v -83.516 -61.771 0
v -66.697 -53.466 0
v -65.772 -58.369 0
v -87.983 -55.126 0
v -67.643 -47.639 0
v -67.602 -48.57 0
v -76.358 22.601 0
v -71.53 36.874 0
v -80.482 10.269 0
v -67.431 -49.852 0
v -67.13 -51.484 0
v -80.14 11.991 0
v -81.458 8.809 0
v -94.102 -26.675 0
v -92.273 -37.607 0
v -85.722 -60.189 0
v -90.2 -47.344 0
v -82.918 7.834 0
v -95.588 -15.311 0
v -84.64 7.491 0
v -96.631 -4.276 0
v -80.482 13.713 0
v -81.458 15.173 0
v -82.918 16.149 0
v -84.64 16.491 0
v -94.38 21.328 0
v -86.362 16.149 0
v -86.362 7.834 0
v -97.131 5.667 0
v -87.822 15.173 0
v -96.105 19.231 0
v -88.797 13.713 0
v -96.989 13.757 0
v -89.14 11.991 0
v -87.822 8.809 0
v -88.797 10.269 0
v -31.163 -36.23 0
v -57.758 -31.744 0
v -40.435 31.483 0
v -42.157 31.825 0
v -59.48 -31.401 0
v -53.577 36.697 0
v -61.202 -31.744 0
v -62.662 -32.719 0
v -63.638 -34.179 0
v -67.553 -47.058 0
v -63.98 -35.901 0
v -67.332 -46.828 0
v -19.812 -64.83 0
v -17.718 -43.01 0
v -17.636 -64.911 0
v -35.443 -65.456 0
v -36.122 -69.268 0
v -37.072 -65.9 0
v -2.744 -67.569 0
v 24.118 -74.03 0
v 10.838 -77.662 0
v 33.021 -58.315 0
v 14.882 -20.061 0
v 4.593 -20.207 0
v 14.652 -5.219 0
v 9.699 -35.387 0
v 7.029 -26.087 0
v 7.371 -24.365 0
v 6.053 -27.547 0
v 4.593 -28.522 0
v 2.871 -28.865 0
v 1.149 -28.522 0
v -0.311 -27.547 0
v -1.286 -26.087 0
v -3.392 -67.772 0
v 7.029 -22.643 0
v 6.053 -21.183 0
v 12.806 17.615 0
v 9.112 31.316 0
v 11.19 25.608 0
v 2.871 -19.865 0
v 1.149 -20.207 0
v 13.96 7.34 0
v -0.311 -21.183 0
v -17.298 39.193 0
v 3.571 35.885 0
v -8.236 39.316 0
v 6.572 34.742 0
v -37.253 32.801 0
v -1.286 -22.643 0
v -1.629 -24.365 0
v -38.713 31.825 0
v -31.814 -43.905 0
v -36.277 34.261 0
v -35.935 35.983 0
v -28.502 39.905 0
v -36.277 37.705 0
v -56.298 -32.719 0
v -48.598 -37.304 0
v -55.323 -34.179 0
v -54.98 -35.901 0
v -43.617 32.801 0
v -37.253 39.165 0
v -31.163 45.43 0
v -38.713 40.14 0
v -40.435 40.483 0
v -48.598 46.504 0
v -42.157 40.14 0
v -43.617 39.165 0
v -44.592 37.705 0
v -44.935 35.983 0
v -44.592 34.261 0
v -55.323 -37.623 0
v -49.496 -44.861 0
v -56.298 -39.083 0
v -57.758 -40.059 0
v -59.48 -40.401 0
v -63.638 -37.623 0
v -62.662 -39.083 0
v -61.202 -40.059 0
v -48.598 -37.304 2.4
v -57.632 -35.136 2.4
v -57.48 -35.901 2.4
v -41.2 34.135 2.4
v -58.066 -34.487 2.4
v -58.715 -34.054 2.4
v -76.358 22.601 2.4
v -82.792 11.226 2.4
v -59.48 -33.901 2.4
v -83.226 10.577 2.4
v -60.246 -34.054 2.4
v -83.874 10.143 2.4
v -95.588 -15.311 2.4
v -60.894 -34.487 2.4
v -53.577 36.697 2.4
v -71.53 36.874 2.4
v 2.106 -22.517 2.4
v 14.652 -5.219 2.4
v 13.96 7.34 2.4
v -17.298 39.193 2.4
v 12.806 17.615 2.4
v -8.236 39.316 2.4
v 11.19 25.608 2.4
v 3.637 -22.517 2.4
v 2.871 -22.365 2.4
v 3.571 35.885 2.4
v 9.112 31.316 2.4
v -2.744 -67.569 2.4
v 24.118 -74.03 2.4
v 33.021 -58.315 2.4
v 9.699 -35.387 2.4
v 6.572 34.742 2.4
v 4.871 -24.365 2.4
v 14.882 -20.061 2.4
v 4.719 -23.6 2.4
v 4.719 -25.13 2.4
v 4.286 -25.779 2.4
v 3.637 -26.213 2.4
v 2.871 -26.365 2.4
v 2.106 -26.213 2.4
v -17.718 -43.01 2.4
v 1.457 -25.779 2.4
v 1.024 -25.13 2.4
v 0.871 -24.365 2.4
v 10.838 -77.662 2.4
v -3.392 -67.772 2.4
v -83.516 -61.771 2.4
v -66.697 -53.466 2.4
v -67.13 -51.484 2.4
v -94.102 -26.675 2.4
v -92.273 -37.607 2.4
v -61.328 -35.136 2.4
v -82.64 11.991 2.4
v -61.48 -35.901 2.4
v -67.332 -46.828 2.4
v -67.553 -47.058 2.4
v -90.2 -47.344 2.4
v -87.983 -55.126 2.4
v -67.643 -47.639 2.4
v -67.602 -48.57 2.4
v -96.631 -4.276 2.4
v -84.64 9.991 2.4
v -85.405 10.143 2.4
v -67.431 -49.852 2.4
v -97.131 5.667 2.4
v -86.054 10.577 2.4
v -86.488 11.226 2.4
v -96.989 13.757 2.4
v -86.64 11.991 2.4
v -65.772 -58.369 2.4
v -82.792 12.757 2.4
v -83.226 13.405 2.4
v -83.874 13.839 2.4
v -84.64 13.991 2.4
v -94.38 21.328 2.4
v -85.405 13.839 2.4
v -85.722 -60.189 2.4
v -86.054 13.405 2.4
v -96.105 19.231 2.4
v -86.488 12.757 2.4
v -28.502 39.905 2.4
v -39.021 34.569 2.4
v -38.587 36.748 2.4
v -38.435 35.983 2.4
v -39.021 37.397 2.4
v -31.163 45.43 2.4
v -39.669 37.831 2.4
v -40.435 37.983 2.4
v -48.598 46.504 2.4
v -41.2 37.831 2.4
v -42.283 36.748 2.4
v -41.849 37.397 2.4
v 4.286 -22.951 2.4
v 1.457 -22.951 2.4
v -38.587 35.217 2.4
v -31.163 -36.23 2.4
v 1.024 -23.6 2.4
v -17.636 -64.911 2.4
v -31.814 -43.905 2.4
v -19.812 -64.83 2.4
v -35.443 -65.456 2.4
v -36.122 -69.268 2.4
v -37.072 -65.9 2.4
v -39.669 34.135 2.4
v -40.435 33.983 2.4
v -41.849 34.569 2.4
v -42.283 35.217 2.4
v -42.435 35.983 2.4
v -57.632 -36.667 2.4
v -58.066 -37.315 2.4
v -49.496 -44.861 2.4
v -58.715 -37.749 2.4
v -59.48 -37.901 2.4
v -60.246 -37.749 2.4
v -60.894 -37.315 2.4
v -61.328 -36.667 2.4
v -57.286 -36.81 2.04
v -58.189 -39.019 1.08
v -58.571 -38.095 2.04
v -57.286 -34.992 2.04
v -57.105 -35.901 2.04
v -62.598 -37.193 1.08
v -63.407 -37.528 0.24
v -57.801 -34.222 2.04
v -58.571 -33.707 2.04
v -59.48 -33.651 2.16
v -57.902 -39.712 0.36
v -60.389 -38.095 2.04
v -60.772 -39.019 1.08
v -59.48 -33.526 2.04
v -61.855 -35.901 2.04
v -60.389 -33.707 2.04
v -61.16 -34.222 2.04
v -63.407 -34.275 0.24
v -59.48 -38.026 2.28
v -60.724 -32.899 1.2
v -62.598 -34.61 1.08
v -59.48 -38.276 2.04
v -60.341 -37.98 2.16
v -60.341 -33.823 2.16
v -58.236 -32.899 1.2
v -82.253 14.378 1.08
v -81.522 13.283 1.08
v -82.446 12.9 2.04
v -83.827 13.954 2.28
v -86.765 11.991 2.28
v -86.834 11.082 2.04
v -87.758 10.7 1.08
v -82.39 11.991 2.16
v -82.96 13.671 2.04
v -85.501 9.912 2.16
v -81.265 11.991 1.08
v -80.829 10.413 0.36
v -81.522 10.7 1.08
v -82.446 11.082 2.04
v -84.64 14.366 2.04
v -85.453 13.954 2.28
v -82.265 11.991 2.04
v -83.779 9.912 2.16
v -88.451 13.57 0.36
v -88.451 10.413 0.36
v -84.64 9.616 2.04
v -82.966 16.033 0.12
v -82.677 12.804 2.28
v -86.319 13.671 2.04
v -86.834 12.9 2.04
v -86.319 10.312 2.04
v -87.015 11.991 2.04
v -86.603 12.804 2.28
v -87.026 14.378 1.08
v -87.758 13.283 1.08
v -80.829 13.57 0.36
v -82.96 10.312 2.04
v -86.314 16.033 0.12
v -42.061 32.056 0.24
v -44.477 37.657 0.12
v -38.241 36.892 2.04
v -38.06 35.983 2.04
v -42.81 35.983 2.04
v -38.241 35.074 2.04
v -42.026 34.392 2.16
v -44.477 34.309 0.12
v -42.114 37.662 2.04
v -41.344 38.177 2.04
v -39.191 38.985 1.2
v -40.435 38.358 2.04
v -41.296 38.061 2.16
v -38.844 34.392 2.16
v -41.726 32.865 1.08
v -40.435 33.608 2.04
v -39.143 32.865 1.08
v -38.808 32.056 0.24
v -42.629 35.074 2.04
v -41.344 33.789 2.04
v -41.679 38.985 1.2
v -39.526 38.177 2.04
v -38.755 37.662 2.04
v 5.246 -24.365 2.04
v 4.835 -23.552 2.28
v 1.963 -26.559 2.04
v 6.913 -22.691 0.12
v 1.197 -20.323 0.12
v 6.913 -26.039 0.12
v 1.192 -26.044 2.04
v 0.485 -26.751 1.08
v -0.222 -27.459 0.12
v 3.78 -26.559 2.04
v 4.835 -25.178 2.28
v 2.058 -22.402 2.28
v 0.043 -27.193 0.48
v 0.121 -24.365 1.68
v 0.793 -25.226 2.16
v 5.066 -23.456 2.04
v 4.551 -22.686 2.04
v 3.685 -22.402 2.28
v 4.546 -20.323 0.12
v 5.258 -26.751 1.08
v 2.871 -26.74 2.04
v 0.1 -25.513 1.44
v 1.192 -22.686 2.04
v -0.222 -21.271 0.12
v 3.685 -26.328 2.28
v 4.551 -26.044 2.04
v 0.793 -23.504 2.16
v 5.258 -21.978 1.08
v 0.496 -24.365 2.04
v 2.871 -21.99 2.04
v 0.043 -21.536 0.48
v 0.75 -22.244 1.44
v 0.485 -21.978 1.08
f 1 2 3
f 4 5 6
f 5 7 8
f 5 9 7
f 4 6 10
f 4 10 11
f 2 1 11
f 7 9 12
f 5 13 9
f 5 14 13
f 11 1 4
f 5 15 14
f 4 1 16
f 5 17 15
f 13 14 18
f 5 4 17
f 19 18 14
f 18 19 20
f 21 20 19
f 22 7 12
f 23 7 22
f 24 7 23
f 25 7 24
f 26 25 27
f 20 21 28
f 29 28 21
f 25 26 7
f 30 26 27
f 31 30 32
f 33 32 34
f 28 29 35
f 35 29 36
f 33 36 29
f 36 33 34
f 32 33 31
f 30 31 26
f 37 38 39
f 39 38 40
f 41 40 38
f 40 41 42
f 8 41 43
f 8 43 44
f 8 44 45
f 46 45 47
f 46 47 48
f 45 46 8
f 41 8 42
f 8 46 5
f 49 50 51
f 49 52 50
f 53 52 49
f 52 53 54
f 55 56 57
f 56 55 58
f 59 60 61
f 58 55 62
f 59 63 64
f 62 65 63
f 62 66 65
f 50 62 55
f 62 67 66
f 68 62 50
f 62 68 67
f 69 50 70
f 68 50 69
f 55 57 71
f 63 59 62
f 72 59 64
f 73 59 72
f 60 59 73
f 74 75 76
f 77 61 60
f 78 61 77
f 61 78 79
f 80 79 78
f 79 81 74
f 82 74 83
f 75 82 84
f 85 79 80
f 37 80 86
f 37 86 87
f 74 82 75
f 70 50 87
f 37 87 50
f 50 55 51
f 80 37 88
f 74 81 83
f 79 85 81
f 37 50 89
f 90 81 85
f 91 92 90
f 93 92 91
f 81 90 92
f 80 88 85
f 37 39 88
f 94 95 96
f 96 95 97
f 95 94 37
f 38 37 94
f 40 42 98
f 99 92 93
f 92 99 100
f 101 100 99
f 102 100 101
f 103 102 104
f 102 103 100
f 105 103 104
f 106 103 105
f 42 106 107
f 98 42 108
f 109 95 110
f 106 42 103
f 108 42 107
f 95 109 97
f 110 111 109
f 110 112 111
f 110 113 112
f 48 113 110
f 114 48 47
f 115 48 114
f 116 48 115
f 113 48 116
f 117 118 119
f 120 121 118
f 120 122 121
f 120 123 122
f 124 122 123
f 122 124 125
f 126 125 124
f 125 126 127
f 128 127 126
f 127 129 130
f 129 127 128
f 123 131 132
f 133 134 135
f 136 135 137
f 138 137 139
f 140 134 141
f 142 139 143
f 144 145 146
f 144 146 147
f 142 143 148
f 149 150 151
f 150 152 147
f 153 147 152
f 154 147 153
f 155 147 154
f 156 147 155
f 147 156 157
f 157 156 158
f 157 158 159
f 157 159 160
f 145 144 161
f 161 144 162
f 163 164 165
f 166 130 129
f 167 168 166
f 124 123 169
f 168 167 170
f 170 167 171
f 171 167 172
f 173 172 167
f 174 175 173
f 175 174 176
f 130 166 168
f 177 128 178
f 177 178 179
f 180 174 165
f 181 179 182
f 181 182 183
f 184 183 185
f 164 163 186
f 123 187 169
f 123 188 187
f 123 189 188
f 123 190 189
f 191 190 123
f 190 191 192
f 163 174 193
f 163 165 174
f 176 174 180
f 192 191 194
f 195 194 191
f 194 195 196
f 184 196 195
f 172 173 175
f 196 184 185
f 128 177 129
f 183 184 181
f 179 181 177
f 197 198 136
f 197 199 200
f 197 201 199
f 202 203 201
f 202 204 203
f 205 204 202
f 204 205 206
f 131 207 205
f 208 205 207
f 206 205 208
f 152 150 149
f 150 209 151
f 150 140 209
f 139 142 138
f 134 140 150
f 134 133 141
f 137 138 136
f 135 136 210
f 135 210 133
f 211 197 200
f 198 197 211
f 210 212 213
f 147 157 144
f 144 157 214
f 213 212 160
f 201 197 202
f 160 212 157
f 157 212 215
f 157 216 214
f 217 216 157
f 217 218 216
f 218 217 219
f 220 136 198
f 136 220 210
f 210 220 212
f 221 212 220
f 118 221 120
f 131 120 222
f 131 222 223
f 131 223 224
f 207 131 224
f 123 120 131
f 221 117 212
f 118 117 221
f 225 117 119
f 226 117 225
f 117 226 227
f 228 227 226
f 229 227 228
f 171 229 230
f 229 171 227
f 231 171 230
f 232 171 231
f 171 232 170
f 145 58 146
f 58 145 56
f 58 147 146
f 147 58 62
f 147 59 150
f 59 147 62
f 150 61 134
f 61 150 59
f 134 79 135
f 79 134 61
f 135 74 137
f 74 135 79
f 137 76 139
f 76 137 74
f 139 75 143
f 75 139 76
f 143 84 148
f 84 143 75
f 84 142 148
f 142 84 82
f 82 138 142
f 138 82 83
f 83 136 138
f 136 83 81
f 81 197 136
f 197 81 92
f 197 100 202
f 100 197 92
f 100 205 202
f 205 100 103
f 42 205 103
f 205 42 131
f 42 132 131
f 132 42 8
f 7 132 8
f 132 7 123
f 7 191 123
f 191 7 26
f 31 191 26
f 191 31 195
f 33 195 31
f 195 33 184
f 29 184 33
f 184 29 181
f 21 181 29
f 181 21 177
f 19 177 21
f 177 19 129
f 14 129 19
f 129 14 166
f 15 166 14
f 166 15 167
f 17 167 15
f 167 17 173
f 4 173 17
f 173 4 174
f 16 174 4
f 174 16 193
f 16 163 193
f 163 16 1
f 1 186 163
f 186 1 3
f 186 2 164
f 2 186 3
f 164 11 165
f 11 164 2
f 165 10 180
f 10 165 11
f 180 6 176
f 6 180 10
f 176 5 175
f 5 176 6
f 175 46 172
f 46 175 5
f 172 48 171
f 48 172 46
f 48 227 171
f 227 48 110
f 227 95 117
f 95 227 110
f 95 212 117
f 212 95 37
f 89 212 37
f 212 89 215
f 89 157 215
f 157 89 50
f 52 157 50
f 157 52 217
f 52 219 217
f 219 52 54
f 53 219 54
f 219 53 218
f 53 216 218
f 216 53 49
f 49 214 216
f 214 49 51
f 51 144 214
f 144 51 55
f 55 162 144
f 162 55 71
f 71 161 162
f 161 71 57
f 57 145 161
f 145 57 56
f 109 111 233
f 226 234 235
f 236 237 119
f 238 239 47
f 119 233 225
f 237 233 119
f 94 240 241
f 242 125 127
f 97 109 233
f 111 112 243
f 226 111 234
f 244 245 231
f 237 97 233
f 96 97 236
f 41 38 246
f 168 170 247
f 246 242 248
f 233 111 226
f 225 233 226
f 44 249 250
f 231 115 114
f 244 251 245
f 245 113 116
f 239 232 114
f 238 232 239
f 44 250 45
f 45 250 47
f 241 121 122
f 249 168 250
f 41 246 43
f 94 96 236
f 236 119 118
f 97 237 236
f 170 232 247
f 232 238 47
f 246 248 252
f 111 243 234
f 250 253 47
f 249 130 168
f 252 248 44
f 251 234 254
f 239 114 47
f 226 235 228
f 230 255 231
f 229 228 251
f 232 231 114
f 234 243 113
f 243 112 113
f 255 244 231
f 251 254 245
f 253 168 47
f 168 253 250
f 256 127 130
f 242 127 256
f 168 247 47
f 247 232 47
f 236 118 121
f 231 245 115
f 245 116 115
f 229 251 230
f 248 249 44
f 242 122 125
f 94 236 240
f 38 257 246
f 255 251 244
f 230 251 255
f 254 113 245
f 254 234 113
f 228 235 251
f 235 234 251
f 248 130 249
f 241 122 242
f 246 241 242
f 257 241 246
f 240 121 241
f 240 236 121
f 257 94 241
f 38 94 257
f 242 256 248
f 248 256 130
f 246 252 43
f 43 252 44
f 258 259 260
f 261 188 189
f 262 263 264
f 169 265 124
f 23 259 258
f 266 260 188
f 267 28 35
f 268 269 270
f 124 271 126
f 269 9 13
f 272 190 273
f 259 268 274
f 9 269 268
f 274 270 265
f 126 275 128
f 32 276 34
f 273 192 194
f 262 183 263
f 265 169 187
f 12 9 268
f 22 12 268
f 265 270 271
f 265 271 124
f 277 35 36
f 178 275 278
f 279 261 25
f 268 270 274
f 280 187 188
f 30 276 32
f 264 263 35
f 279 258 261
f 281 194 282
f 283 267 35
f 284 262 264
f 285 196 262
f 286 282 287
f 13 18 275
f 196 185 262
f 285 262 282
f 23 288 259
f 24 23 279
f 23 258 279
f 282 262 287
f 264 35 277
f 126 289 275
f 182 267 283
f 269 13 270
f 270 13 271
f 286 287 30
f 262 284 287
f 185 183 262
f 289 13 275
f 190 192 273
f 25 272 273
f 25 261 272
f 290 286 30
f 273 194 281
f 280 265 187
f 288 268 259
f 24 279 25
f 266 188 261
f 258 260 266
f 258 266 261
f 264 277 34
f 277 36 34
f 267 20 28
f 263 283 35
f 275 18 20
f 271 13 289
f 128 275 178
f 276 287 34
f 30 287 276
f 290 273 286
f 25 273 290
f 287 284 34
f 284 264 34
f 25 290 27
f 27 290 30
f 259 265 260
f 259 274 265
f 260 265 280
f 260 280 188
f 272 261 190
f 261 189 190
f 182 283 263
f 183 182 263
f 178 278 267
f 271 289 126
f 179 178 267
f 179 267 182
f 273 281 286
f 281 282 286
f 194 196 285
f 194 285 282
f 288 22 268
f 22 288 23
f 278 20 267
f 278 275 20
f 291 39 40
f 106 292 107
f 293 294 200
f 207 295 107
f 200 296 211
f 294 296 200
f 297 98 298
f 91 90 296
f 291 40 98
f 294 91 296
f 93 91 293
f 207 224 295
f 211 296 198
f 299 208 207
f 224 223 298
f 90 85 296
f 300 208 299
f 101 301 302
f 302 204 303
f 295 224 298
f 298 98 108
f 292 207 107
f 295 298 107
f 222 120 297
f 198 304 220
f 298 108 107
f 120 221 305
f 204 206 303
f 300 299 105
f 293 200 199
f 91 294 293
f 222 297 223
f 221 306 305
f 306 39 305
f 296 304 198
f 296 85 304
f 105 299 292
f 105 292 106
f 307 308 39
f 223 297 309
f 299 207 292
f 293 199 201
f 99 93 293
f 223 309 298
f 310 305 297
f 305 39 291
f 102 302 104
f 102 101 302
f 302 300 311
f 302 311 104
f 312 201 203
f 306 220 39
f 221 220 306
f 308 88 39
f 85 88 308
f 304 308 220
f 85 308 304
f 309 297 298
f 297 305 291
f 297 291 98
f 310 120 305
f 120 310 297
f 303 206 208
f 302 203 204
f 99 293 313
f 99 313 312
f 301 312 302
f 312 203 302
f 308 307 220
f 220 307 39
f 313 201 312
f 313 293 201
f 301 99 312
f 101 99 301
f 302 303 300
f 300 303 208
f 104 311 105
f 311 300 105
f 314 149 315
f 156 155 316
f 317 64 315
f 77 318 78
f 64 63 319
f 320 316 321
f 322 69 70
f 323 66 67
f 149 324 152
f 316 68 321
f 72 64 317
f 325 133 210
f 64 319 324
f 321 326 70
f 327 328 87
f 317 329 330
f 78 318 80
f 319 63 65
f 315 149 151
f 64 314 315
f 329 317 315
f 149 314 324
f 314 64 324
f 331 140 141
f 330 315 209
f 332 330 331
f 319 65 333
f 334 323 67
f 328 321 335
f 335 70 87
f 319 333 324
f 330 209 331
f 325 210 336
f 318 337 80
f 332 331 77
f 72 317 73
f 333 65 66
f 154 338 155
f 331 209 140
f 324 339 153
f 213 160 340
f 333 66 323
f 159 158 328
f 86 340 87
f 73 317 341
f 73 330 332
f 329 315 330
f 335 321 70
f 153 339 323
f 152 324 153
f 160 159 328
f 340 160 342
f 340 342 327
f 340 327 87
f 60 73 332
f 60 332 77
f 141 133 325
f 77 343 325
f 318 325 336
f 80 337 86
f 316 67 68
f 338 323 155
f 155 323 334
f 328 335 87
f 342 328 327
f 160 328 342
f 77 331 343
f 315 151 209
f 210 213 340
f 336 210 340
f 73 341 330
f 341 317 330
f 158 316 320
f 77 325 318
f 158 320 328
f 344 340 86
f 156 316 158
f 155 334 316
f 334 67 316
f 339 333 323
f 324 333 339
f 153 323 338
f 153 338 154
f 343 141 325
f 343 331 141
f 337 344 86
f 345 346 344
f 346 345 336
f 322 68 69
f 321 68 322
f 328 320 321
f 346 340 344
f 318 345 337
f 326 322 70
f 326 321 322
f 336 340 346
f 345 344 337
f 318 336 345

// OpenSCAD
difference(){
	linear_extrude(height=2.400000, center=false, convexity=10, slices=20, scale=[1.000000, 1.000000], $fn=16)
		polygon(points=[[9.699329, -35.386525], [33.020906, -58.315021], [24.118242, -74.030071], [10.837673, -77.661521], [-3.391719, -67.772410], [-2.743570, -67.569144], [-17.635520, -64.911272], [-19.812201, -64.829592], [-36.121991, -69.268159], [-37.072059, -65.899573], [-35.442781, -65.456179], [-17.717994, -43.009609], [-31.814351, -43.904884], [-31.163388, -36.230470], [-48.597618, -37.304312], [-49.496186, -44.860698], [-67.331731, -46.827806], [-67.552546, -47.058178], [-67.642740, -47.638936], [-67.602312, -48.570081], [-67.431262, -49.851611], [-67.129590, -51.483529], [-66.697296, -53.465832], [-65.771950, -58.369283], [-83.515837, -61.771452], [-85.722074, -60.188712], [-87.983445, -55.125736], [-90.200333, -47.344487], [-92.273121, -37.606930], [-94.102191, -26.675029], [-95.587927, -15.310747], [-96.630711, -4.276049], [-97.130926, 5.667102], [-96.988956, 13.756741], [-96.105182, 19.230905], [-94.379988, 21.327630], [-76.357842, 22.601417], [-71.530308, 36.874018], [-53.577484, 36.697223], [-48.597618, 46.504312], [-31.163388, 45.430470], [-28.501680, 39.904884], [-17.297865, 39.193318], [-8.235822, 39.315873], [3.570552, 35.884616], [6.572287, 34.742191], [9.112077, 31.316512], [11.189919, 25.607577], [12.805816, 17.615387], [13.959767, 7.339943], [14.651771, -5.218757], [14.881829, -20.060711]], convexity=10);
	translate([-59.480160, -35.901270, 0.000000])
		linear_extrude(height=2.400000, center=false, convexity=10, slices=20, scale=[0.444444, 0.444444], $fn=16)
			circle(4.500000);
	translate([-84.639761, 11.991156, 0.000000])
		linear_extrude(height=2.400000, center=false, convexity=10, slices=20, scale=[0.444444, 0.444444], $fn=16)
			circle(4.500000);
	translate([-40.434809, 35.982766, 0.000000])
		linear_extrude(height=2.400000, center=false, convexity=10, slices=20, scale=[0.444444, 0.444444], $fn=16)
			circle(4.500000);
	translate([2.871406, -24.364927, 0.000000])
		linear_extrude(height=2.400000, center=false, convexity=10, slices=20, scale=[0.444444, 0.444444], $fn=16)
			circle(4.500000);
}
